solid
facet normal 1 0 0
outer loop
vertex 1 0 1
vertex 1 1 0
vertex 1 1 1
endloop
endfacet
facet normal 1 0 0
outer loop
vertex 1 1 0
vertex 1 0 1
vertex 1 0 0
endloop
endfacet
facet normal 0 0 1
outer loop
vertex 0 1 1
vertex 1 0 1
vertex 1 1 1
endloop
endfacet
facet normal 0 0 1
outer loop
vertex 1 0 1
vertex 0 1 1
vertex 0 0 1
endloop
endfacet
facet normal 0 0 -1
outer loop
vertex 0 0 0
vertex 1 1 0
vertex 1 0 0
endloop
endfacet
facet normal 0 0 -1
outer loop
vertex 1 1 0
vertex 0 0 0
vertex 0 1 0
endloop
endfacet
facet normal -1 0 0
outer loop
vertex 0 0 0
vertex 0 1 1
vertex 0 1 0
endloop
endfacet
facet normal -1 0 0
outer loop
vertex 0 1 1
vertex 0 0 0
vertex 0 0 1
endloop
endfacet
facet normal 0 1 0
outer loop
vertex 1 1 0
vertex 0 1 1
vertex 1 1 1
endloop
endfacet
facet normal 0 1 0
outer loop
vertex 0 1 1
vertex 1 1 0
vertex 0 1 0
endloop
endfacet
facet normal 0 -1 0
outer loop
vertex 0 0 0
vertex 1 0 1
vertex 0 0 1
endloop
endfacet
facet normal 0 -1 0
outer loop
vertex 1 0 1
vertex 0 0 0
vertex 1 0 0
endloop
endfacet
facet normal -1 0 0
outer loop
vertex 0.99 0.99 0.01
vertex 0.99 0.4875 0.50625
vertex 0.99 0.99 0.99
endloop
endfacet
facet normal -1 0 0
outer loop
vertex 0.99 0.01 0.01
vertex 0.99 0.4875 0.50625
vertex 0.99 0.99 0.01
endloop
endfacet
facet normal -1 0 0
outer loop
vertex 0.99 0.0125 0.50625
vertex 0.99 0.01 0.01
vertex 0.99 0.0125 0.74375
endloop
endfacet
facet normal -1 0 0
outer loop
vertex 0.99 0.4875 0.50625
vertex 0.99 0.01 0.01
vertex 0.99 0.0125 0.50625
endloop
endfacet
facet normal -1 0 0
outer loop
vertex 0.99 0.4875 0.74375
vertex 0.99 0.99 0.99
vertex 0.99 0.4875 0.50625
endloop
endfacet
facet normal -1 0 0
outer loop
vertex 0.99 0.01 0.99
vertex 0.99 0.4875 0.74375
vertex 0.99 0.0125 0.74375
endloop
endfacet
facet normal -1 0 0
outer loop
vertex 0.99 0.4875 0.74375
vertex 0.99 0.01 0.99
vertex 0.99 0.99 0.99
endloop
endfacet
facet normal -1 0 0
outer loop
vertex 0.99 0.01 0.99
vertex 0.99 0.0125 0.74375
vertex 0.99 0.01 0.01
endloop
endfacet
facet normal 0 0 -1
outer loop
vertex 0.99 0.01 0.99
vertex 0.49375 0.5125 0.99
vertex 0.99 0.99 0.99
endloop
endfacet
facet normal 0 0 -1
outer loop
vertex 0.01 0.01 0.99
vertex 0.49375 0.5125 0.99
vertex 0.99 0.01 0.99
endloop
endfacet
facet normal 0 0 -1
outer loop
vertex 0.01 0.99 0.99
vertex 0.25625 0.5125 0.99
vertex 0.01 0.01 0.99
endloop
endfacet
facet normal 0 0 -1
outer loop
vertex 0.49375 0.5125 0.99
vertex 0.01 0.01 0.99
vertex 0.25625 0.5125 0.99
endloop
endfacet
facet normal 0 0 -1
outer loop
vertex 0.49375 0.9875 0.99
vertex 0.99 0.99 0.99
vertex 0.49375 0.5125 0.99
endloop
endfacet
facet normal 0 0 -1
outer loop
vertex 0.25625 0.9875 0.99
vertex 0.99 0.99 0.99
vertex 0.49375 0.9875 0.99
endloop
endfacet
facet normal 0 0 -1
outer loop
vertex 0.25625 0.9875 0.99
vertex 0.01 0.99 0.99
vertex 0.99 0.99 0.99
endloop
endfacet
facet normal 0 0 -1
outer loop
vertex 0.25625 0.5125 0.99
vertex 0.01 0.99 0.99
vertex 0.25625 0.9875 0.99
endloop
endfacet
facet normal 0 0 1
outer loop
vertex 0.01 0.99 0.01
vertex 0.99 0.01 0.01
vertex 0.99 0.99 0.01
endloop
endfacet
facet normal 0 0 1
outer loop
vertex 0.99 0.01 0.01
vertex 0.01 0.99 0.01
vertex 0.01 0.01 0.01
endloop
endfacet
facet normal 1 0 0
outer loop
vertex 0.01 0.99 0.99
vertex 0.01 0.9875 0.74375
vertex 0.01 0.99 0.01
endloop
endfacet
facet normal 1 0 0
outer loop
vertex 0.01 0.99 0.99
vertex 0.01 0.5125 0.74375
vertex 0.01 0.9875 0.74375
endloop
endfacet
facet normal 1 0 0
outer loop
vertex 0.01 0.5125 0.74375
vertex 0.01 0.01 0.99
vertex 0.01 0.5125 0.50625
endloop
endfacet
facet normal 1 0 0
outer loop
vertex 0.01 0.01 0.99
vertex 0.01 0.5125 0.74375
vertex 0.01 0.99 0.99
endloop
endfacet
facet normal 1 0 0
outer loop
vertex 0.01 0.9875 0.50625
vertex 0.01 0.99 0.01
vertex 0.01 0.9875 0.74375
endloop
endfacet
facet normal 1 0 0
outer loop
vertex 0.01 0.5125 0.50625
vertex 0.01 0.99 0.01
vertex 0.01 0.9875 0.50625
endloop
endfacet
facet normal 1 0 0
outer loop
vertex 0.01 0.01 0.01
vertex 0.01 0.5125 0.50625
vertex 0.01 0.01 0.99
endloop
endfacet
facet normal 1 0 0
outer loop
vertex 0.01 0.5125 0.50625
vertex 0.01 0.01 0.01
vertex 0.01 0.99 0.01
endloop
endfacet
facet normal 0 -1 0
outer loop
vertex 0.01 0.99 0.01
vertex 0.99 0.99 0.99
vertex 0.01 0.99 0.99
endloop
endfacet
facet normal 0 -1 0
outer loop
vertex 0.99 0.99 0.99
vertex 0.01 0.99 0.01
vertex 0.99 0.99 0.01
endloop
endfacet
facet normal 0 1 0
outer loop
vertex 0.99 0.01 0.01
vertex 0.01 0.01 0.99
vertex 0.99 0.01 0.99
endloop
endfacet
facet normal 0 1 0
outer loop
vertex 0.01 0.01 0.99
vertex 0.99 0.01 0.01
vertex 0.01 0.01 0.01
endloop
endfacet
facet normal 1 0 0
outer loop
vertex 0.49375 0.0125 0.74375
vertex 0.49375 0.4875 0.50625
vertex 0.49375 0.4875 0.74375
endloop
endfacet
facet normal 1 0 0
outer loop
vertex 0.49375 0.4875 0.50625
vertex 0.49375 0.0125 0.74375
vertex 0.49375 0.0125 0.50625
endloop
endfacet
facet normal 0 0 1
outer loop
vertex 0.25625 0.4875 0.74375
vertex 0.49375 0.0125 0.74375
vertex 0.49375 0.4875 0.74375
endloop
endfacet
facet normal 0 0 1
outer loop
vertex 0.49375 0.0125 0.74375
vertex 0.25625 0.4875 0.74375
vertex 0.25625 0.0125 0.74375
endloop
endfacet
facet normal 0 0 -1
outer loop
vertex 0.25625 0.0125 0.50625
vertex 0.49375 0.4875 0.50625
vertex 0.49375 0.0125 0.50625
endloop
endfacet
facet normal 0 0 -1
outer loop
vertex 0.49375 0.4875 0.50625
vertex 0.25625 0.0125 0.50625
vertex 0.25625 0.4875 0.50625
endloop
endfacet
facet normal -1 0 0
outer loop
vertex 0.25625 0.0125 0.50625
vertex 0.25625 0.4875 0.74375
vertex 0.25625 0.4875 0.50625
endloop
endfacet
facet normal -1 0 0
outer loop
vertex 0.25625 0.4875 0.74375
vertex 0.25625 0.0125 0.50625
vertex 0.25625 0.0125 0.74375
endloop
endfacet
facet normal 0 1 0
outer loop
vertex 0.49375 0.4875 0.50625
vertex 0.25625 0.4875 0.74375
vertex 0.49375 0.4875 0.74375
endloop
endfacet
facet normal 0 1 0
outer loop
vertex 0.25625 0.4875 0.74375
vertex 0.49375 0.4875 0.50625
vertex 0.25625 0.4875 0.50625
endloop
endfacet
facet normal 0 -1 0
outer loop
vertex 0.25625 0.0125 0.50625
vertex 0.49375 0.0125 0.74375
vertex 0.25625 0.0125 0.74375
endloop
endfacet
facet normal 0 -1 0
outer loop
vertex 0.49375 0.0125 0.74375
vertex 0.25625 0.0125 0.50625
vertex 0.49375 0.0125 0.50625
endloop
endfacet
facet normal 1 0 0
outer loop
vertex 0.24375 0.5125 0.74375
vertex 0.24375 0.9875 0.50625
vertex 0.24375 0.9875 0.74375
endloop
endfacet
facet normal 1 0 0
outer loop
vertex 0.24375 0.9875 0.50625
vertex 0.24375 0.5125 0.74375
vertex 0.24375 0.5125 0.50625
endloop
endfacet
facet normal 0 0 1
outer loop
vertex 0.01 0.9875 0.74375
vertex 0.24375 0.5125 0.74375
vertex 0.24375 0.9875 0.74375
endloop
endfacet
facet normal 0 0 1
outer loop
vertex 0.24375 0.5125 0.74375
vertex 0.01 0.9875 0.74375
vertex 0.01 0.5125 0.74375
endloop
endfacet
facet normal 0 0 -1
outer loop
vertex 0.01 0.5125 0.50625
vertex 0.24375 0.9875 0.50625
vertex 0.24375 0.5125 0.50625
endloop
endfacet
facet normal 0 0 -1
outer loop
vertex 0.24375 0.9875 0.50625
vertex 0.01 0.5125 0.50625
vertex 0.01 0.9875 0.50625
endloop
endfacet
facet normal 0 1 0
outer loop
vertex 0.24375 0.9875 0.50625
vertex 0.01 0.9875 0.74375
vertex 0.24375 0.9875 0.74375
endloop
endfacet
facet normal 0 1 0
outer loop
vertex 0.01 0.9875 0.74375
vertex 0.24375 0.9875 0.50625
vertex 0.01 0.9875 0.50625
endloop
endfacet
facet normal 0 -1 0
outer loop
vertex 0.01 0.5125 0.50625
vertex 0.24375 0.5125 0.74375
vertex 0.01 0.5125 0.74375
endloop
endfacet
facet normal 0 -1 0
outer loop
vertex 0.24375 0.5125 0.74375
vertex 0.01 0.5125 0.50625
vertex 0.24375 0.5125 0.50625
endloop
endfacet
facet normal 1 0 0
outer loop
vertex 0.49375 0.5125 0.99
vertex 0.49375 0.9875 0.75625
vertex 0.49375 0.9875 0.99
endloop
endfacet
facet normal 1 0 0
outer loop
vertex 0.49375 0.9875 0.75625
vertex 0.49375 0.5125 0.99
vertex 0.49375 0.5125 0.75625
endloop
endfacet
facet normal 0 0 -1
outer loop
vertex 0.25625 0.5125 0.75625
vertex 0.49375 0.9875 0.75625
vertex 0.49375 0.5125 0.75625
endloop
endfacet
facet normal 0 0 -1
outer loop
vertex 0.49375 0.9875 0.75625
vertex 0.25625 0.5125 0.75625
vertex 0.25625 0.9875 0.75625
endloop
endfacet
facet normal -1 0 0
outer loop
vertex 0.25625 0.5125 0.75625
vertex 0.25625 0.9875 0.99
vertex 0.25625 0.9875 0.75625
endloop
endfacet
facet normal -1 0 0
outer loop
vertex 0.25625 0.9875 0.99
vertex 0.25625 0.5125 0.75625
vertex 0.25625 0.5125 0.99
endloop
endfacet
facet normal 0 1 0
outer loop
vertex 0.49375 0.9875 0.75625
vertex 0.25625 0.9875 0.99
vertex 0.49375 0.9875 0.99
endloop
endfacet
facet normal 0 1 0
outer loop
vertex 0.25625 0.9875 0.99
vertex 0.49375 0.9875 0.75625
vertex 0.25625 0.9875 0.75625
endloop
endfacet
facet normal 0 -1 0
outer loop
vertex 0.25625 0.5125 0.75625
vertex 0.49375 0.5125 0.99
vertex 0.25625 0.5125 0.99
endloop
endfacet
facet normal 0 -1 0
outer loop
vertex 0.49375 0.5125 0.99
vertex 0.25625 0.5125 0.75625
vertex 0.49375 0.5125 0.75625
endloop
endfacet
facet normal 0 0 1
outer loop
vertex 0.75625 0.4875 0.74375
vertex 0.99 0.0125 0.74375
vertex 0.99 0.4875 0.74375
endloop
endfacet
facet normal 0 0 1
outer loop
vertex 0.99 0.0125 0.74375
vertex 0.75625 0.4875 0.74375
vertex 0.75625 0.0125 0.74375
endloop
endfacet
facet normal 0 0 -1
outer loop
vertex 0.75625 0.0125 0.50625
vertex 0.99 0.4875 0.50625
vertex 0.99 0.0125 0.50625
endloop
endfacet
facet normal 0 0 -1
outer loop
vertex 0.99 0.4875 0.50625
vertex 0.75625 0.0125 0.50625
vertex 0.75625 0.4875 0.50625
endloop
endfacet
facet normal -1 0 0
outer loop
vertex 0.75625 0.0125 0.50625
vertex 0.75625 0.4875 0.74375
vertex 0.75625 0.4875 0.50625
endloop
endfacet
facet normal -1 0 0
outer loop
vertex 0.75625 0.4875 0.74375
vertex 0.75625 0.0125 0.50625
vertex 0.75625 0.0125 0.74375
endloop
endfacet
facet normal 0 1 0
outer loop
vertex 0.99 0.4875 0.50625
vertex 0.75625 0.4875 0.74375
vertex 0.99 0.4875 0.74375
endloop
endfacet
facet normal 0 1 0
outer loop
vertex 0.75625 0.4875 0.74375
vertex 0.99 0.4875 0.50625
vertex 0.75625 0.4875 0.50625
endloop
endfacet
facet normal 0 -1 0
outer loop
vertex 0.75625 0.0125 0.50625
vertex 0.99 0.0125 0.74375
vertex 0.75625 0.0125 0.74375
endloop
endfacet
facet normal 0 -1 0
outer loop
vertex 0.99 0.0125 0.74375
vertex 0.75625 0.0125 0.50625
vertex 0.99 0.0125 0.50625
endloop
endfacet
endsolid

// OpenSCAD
translate([0.375, 0.25, 0.625]) color([0.14833972802097417, 0.6068004170768148, 0.5080529466064481]) cube([0.2375, 0.475, 0.2375], center=true);
translate([0.125, 0.75, 0.625]) color([0.9906187087676633, 0.11352393843166497, 0.6883720652754897]) cube([0.2375, 0.475, 0.2375], center=true);
translate([0.375, 0.75, 0.875]) color([0.5952346609945763, 0.6540807806784664, 0.3474259839548979]) cube([0.2375, 0.475, 0.2375], center=true);
translate([0.875, 0.25, 0.625]) color([0.9928586924360654, 0.247192741454632, 0.70975753974483]) cube([0.2375, 0.475, 0.2375], center=true);
color([0.3,0.3,0.3,0.3]) difference() { cube([1,1,1]); translate([0.01,0.01,0.01]) cube([0.98,0.98,0.98]); }
